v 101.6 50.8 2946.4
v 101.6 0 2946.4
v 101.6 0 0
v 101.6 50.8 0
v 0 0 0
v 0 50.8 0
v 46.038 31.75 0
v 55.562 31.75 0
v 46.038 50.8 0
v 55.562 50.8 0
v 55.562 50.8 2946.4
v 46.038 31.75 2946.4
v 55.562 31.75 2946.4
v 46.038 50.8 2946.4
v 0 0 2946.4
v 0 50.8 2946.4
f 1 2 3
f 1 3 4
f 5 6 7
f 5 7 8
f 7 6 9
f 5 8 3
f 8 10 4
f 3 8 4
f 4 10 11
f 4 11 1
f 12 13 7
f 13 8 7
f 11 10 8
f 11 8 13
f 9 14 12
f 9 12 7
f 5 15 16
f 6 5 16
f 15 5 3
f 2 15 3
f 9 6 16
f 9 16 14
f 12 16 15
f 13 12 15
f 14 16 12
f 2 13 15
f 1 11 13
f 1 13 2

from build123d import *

# Parameters (mm, degrees)
SKETCH1_W           = 101.6
SKETCH1_H           = 50.8
BOSS_EXTRUDE1_DEPTH = 2946.4
CUT_EXTRUDE1_DEPTH  = 19.05


with BuildPart() as part:
    # Sketch1 → Boss-Extrude1 (new body)
    with BuildSketch(Plane.XY):
        with Locations((50.8, 25.4)):
            Rectangle(SKETCH1_W, SKETCH1_H)
    extrude(amount=BOSS_EXTRUDE1_DEPTH)

    # Sketch2 → Cut-Extrude1 (cut)
    with BuildSketch(Plane(origin=(0, 50.8, 0), x_dir=(1, 0, 0), z_dir=(0, 1, 0))):
        Polygon((50.8, -2946.4), (46.0375, -2946.4), (46.0375, 0), (55.5625, 0), (55.5625, -2946.4), align=None)
    extrude(amount=-CUT_EXTRUDE1_DEPTH, mode=Mode.SUBTRACT)


solid = part.part
